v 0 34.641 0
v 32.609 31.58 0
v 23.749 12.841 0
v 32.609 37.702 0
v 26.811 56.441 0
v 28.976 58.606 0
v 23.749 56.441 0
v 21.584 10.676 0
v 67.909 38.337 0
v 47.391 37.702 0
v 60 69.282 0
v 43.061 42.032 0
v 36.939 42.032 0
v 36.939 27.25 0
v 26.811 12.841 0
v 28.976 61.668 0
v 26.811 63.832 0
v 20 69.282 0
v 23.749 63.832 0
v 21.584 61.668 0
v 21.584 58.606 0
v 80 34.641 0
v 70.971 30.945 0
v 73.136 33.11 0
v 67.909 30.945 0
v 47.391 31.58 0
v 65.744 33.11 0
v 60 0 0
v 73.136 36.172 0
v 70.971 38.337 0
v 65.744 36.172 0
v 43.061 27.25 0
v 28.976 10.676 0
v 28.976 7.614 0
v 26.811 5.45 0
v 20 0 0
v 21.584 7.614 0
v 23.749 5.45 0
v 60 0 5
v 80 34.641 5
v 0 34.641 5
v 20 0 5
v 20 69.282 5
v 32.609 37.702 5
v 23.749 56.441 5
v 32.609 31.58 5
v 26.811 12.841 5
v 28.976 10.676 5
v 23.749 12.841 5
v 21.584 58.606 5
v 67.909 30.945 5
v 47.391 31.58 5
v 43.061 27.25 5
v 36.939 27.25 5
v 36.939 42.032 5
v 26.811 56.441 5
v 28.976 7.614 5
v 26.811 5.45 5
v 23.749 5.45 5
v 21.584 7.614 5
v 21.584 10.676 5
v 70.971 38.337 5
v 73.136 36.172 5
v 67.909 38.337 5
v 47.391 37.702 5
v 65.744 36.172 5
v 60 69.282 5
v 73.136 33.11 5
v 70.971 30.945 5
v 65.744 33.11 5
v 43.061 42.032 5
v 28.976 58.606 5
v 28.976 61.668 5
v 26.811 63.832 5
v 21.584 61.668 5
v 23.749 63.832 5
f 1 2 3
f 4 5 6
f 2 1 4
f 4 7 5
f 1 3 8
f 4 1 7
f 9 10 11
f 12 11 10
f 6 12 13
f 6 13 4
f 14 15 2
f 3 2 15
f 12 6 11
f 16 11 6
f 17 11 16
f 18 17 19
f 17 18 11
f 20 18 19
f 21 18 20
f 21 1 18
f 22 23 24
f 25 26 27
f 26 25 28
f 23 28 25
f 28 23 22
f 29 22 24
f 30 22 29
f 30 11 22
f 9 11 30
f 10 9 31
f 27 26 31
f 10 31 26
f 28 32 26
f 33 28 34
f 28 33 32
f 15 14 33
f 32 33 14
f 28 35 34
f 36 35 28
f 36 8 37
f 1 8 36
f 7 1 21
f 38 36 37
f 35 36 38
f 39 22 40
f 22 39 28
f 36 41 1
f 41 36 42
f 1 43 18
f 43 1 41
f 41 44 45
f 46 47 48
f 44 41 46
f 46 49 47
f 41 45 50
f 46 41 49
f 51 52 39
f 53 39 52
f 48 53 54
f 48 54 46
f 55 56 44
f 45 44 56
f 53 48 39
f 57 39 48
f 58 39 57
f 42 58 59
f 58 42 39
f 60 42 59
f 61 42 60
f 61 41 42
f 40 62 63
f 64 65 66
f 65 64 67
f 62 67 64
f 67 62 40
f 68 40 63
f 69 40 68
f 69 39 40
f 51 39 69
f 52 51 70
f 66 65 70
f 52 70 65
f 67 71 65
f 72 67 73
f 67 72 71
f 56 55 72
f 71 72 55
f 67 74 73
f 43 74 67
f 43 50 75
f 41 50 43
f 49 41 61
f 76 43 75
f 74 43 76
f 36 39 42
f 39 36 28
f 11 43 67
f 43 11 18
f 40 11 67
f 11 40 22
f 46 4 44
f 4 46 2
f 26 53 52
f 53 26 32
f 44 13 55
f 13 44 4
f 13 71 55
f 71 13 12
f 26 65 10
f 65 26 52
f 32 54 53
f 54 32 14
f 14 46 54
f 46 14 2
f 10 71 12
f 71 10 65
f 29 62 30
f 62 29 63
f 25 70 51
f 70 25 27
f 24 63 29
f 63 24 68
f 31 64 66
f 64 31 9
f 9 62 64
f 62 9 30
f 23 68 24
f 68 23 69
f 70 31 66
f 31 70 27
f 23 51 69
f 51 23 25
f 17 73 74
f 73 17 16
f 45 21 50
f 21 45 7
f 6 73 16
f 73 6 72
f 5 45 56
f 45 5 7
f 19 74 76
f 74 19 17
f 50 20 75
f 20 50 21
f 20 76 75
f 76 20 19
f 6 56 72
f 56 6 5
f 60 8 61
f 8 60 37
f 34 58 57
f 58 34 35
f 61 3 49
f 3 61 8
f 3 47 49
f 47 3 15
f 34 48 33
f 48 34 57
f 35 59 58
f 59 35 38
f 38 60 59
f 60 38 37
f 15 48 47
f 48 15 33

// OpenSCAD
$fn = 32;

// ----------------------------------------------------------------------
// Polygon plate: 6-gon R40, 3 bolt windows
// ----------------------------------------------------------------------

// --- parameters (mm) ---
sides = 6;                // number of polygon sides
plate_r = 40;             // circumscribed radius of the polygon
bore_r = 8;               // centre bore radius
bolts = 3;                // number of bolt windows
ring_r = 29.44;           // bolt-circle radius
bolt_r = 4;               // bolt window radius
plate_t = 5;              // plate thickness, Z (extrusion height)

plate_d = 2 * plate_r;  // circumscribed diameter
bore_d = 2 * bore_r;  // centre bore diameter
bolt_d = 2 * bolt_r;  // bolt window diameter
ring_d = 2 * ring_r;  // bolt-circle diameter

profile = [[80, 34.641], [60, 69.282], [20, 69.282], [0, 34.641], [20, 0], [60, 0]];  // primary outline, 6 points, counter clockwise
void_1 = [[47.391, 37.702], [43.061, 42.032], [36.939, 42.032], [32.609, 37.702], [32.609, 31.58], [36.939, 27.25], [43.061, 27.25], [47.391, 31.58]];  // centre bore, 8 points
void_2 = [[73.136, 36.172], [70.971, 38.337], [67.909, 38.337], [65.744, 36.172], [65.744, 33.11], [67.909, 30.945], [70.971, 30.945], [73.136, 33.11]];  // bolt window 1, 8 points
void_3 = [[28.976, 61.668], [26.811, 63.832], [23.749, 63.832], [21.584, 61.668], [21.584, 58.606], [23.749, 56.441], [26.811, 56.441], [28.976, 58.606]];  // bolt window 2, 8 points
void_4 = [[28.976, 10.676], [26.811, 12.841], [23.749, 12.841], [21.584, 10.676], [21.584, 7.614], [23.749, 5.45], [26.811, 5.45], [28.976, 7.614]];  // bolt window 3, 8 points

// --- the one profile operation ---
difference() {
  linear_extrude(height = plate_t) polygon(points = profile);
  translate([0, 0, -1])
    linear_extrude(height = plate_t + 2) polygon(points = void_1);
  translate([0, 0, -1])
    linear_extrude(height = plate_t + 2) polygon(points = void_2);
  translate([0, 0, -1])
    linear_extrude(height = plate_t + 2) polygon(points = void_3);
  translate([0, 0, -1])
    linear_extrude(height = plate_t + 2) polygon(points = void_4);
}
